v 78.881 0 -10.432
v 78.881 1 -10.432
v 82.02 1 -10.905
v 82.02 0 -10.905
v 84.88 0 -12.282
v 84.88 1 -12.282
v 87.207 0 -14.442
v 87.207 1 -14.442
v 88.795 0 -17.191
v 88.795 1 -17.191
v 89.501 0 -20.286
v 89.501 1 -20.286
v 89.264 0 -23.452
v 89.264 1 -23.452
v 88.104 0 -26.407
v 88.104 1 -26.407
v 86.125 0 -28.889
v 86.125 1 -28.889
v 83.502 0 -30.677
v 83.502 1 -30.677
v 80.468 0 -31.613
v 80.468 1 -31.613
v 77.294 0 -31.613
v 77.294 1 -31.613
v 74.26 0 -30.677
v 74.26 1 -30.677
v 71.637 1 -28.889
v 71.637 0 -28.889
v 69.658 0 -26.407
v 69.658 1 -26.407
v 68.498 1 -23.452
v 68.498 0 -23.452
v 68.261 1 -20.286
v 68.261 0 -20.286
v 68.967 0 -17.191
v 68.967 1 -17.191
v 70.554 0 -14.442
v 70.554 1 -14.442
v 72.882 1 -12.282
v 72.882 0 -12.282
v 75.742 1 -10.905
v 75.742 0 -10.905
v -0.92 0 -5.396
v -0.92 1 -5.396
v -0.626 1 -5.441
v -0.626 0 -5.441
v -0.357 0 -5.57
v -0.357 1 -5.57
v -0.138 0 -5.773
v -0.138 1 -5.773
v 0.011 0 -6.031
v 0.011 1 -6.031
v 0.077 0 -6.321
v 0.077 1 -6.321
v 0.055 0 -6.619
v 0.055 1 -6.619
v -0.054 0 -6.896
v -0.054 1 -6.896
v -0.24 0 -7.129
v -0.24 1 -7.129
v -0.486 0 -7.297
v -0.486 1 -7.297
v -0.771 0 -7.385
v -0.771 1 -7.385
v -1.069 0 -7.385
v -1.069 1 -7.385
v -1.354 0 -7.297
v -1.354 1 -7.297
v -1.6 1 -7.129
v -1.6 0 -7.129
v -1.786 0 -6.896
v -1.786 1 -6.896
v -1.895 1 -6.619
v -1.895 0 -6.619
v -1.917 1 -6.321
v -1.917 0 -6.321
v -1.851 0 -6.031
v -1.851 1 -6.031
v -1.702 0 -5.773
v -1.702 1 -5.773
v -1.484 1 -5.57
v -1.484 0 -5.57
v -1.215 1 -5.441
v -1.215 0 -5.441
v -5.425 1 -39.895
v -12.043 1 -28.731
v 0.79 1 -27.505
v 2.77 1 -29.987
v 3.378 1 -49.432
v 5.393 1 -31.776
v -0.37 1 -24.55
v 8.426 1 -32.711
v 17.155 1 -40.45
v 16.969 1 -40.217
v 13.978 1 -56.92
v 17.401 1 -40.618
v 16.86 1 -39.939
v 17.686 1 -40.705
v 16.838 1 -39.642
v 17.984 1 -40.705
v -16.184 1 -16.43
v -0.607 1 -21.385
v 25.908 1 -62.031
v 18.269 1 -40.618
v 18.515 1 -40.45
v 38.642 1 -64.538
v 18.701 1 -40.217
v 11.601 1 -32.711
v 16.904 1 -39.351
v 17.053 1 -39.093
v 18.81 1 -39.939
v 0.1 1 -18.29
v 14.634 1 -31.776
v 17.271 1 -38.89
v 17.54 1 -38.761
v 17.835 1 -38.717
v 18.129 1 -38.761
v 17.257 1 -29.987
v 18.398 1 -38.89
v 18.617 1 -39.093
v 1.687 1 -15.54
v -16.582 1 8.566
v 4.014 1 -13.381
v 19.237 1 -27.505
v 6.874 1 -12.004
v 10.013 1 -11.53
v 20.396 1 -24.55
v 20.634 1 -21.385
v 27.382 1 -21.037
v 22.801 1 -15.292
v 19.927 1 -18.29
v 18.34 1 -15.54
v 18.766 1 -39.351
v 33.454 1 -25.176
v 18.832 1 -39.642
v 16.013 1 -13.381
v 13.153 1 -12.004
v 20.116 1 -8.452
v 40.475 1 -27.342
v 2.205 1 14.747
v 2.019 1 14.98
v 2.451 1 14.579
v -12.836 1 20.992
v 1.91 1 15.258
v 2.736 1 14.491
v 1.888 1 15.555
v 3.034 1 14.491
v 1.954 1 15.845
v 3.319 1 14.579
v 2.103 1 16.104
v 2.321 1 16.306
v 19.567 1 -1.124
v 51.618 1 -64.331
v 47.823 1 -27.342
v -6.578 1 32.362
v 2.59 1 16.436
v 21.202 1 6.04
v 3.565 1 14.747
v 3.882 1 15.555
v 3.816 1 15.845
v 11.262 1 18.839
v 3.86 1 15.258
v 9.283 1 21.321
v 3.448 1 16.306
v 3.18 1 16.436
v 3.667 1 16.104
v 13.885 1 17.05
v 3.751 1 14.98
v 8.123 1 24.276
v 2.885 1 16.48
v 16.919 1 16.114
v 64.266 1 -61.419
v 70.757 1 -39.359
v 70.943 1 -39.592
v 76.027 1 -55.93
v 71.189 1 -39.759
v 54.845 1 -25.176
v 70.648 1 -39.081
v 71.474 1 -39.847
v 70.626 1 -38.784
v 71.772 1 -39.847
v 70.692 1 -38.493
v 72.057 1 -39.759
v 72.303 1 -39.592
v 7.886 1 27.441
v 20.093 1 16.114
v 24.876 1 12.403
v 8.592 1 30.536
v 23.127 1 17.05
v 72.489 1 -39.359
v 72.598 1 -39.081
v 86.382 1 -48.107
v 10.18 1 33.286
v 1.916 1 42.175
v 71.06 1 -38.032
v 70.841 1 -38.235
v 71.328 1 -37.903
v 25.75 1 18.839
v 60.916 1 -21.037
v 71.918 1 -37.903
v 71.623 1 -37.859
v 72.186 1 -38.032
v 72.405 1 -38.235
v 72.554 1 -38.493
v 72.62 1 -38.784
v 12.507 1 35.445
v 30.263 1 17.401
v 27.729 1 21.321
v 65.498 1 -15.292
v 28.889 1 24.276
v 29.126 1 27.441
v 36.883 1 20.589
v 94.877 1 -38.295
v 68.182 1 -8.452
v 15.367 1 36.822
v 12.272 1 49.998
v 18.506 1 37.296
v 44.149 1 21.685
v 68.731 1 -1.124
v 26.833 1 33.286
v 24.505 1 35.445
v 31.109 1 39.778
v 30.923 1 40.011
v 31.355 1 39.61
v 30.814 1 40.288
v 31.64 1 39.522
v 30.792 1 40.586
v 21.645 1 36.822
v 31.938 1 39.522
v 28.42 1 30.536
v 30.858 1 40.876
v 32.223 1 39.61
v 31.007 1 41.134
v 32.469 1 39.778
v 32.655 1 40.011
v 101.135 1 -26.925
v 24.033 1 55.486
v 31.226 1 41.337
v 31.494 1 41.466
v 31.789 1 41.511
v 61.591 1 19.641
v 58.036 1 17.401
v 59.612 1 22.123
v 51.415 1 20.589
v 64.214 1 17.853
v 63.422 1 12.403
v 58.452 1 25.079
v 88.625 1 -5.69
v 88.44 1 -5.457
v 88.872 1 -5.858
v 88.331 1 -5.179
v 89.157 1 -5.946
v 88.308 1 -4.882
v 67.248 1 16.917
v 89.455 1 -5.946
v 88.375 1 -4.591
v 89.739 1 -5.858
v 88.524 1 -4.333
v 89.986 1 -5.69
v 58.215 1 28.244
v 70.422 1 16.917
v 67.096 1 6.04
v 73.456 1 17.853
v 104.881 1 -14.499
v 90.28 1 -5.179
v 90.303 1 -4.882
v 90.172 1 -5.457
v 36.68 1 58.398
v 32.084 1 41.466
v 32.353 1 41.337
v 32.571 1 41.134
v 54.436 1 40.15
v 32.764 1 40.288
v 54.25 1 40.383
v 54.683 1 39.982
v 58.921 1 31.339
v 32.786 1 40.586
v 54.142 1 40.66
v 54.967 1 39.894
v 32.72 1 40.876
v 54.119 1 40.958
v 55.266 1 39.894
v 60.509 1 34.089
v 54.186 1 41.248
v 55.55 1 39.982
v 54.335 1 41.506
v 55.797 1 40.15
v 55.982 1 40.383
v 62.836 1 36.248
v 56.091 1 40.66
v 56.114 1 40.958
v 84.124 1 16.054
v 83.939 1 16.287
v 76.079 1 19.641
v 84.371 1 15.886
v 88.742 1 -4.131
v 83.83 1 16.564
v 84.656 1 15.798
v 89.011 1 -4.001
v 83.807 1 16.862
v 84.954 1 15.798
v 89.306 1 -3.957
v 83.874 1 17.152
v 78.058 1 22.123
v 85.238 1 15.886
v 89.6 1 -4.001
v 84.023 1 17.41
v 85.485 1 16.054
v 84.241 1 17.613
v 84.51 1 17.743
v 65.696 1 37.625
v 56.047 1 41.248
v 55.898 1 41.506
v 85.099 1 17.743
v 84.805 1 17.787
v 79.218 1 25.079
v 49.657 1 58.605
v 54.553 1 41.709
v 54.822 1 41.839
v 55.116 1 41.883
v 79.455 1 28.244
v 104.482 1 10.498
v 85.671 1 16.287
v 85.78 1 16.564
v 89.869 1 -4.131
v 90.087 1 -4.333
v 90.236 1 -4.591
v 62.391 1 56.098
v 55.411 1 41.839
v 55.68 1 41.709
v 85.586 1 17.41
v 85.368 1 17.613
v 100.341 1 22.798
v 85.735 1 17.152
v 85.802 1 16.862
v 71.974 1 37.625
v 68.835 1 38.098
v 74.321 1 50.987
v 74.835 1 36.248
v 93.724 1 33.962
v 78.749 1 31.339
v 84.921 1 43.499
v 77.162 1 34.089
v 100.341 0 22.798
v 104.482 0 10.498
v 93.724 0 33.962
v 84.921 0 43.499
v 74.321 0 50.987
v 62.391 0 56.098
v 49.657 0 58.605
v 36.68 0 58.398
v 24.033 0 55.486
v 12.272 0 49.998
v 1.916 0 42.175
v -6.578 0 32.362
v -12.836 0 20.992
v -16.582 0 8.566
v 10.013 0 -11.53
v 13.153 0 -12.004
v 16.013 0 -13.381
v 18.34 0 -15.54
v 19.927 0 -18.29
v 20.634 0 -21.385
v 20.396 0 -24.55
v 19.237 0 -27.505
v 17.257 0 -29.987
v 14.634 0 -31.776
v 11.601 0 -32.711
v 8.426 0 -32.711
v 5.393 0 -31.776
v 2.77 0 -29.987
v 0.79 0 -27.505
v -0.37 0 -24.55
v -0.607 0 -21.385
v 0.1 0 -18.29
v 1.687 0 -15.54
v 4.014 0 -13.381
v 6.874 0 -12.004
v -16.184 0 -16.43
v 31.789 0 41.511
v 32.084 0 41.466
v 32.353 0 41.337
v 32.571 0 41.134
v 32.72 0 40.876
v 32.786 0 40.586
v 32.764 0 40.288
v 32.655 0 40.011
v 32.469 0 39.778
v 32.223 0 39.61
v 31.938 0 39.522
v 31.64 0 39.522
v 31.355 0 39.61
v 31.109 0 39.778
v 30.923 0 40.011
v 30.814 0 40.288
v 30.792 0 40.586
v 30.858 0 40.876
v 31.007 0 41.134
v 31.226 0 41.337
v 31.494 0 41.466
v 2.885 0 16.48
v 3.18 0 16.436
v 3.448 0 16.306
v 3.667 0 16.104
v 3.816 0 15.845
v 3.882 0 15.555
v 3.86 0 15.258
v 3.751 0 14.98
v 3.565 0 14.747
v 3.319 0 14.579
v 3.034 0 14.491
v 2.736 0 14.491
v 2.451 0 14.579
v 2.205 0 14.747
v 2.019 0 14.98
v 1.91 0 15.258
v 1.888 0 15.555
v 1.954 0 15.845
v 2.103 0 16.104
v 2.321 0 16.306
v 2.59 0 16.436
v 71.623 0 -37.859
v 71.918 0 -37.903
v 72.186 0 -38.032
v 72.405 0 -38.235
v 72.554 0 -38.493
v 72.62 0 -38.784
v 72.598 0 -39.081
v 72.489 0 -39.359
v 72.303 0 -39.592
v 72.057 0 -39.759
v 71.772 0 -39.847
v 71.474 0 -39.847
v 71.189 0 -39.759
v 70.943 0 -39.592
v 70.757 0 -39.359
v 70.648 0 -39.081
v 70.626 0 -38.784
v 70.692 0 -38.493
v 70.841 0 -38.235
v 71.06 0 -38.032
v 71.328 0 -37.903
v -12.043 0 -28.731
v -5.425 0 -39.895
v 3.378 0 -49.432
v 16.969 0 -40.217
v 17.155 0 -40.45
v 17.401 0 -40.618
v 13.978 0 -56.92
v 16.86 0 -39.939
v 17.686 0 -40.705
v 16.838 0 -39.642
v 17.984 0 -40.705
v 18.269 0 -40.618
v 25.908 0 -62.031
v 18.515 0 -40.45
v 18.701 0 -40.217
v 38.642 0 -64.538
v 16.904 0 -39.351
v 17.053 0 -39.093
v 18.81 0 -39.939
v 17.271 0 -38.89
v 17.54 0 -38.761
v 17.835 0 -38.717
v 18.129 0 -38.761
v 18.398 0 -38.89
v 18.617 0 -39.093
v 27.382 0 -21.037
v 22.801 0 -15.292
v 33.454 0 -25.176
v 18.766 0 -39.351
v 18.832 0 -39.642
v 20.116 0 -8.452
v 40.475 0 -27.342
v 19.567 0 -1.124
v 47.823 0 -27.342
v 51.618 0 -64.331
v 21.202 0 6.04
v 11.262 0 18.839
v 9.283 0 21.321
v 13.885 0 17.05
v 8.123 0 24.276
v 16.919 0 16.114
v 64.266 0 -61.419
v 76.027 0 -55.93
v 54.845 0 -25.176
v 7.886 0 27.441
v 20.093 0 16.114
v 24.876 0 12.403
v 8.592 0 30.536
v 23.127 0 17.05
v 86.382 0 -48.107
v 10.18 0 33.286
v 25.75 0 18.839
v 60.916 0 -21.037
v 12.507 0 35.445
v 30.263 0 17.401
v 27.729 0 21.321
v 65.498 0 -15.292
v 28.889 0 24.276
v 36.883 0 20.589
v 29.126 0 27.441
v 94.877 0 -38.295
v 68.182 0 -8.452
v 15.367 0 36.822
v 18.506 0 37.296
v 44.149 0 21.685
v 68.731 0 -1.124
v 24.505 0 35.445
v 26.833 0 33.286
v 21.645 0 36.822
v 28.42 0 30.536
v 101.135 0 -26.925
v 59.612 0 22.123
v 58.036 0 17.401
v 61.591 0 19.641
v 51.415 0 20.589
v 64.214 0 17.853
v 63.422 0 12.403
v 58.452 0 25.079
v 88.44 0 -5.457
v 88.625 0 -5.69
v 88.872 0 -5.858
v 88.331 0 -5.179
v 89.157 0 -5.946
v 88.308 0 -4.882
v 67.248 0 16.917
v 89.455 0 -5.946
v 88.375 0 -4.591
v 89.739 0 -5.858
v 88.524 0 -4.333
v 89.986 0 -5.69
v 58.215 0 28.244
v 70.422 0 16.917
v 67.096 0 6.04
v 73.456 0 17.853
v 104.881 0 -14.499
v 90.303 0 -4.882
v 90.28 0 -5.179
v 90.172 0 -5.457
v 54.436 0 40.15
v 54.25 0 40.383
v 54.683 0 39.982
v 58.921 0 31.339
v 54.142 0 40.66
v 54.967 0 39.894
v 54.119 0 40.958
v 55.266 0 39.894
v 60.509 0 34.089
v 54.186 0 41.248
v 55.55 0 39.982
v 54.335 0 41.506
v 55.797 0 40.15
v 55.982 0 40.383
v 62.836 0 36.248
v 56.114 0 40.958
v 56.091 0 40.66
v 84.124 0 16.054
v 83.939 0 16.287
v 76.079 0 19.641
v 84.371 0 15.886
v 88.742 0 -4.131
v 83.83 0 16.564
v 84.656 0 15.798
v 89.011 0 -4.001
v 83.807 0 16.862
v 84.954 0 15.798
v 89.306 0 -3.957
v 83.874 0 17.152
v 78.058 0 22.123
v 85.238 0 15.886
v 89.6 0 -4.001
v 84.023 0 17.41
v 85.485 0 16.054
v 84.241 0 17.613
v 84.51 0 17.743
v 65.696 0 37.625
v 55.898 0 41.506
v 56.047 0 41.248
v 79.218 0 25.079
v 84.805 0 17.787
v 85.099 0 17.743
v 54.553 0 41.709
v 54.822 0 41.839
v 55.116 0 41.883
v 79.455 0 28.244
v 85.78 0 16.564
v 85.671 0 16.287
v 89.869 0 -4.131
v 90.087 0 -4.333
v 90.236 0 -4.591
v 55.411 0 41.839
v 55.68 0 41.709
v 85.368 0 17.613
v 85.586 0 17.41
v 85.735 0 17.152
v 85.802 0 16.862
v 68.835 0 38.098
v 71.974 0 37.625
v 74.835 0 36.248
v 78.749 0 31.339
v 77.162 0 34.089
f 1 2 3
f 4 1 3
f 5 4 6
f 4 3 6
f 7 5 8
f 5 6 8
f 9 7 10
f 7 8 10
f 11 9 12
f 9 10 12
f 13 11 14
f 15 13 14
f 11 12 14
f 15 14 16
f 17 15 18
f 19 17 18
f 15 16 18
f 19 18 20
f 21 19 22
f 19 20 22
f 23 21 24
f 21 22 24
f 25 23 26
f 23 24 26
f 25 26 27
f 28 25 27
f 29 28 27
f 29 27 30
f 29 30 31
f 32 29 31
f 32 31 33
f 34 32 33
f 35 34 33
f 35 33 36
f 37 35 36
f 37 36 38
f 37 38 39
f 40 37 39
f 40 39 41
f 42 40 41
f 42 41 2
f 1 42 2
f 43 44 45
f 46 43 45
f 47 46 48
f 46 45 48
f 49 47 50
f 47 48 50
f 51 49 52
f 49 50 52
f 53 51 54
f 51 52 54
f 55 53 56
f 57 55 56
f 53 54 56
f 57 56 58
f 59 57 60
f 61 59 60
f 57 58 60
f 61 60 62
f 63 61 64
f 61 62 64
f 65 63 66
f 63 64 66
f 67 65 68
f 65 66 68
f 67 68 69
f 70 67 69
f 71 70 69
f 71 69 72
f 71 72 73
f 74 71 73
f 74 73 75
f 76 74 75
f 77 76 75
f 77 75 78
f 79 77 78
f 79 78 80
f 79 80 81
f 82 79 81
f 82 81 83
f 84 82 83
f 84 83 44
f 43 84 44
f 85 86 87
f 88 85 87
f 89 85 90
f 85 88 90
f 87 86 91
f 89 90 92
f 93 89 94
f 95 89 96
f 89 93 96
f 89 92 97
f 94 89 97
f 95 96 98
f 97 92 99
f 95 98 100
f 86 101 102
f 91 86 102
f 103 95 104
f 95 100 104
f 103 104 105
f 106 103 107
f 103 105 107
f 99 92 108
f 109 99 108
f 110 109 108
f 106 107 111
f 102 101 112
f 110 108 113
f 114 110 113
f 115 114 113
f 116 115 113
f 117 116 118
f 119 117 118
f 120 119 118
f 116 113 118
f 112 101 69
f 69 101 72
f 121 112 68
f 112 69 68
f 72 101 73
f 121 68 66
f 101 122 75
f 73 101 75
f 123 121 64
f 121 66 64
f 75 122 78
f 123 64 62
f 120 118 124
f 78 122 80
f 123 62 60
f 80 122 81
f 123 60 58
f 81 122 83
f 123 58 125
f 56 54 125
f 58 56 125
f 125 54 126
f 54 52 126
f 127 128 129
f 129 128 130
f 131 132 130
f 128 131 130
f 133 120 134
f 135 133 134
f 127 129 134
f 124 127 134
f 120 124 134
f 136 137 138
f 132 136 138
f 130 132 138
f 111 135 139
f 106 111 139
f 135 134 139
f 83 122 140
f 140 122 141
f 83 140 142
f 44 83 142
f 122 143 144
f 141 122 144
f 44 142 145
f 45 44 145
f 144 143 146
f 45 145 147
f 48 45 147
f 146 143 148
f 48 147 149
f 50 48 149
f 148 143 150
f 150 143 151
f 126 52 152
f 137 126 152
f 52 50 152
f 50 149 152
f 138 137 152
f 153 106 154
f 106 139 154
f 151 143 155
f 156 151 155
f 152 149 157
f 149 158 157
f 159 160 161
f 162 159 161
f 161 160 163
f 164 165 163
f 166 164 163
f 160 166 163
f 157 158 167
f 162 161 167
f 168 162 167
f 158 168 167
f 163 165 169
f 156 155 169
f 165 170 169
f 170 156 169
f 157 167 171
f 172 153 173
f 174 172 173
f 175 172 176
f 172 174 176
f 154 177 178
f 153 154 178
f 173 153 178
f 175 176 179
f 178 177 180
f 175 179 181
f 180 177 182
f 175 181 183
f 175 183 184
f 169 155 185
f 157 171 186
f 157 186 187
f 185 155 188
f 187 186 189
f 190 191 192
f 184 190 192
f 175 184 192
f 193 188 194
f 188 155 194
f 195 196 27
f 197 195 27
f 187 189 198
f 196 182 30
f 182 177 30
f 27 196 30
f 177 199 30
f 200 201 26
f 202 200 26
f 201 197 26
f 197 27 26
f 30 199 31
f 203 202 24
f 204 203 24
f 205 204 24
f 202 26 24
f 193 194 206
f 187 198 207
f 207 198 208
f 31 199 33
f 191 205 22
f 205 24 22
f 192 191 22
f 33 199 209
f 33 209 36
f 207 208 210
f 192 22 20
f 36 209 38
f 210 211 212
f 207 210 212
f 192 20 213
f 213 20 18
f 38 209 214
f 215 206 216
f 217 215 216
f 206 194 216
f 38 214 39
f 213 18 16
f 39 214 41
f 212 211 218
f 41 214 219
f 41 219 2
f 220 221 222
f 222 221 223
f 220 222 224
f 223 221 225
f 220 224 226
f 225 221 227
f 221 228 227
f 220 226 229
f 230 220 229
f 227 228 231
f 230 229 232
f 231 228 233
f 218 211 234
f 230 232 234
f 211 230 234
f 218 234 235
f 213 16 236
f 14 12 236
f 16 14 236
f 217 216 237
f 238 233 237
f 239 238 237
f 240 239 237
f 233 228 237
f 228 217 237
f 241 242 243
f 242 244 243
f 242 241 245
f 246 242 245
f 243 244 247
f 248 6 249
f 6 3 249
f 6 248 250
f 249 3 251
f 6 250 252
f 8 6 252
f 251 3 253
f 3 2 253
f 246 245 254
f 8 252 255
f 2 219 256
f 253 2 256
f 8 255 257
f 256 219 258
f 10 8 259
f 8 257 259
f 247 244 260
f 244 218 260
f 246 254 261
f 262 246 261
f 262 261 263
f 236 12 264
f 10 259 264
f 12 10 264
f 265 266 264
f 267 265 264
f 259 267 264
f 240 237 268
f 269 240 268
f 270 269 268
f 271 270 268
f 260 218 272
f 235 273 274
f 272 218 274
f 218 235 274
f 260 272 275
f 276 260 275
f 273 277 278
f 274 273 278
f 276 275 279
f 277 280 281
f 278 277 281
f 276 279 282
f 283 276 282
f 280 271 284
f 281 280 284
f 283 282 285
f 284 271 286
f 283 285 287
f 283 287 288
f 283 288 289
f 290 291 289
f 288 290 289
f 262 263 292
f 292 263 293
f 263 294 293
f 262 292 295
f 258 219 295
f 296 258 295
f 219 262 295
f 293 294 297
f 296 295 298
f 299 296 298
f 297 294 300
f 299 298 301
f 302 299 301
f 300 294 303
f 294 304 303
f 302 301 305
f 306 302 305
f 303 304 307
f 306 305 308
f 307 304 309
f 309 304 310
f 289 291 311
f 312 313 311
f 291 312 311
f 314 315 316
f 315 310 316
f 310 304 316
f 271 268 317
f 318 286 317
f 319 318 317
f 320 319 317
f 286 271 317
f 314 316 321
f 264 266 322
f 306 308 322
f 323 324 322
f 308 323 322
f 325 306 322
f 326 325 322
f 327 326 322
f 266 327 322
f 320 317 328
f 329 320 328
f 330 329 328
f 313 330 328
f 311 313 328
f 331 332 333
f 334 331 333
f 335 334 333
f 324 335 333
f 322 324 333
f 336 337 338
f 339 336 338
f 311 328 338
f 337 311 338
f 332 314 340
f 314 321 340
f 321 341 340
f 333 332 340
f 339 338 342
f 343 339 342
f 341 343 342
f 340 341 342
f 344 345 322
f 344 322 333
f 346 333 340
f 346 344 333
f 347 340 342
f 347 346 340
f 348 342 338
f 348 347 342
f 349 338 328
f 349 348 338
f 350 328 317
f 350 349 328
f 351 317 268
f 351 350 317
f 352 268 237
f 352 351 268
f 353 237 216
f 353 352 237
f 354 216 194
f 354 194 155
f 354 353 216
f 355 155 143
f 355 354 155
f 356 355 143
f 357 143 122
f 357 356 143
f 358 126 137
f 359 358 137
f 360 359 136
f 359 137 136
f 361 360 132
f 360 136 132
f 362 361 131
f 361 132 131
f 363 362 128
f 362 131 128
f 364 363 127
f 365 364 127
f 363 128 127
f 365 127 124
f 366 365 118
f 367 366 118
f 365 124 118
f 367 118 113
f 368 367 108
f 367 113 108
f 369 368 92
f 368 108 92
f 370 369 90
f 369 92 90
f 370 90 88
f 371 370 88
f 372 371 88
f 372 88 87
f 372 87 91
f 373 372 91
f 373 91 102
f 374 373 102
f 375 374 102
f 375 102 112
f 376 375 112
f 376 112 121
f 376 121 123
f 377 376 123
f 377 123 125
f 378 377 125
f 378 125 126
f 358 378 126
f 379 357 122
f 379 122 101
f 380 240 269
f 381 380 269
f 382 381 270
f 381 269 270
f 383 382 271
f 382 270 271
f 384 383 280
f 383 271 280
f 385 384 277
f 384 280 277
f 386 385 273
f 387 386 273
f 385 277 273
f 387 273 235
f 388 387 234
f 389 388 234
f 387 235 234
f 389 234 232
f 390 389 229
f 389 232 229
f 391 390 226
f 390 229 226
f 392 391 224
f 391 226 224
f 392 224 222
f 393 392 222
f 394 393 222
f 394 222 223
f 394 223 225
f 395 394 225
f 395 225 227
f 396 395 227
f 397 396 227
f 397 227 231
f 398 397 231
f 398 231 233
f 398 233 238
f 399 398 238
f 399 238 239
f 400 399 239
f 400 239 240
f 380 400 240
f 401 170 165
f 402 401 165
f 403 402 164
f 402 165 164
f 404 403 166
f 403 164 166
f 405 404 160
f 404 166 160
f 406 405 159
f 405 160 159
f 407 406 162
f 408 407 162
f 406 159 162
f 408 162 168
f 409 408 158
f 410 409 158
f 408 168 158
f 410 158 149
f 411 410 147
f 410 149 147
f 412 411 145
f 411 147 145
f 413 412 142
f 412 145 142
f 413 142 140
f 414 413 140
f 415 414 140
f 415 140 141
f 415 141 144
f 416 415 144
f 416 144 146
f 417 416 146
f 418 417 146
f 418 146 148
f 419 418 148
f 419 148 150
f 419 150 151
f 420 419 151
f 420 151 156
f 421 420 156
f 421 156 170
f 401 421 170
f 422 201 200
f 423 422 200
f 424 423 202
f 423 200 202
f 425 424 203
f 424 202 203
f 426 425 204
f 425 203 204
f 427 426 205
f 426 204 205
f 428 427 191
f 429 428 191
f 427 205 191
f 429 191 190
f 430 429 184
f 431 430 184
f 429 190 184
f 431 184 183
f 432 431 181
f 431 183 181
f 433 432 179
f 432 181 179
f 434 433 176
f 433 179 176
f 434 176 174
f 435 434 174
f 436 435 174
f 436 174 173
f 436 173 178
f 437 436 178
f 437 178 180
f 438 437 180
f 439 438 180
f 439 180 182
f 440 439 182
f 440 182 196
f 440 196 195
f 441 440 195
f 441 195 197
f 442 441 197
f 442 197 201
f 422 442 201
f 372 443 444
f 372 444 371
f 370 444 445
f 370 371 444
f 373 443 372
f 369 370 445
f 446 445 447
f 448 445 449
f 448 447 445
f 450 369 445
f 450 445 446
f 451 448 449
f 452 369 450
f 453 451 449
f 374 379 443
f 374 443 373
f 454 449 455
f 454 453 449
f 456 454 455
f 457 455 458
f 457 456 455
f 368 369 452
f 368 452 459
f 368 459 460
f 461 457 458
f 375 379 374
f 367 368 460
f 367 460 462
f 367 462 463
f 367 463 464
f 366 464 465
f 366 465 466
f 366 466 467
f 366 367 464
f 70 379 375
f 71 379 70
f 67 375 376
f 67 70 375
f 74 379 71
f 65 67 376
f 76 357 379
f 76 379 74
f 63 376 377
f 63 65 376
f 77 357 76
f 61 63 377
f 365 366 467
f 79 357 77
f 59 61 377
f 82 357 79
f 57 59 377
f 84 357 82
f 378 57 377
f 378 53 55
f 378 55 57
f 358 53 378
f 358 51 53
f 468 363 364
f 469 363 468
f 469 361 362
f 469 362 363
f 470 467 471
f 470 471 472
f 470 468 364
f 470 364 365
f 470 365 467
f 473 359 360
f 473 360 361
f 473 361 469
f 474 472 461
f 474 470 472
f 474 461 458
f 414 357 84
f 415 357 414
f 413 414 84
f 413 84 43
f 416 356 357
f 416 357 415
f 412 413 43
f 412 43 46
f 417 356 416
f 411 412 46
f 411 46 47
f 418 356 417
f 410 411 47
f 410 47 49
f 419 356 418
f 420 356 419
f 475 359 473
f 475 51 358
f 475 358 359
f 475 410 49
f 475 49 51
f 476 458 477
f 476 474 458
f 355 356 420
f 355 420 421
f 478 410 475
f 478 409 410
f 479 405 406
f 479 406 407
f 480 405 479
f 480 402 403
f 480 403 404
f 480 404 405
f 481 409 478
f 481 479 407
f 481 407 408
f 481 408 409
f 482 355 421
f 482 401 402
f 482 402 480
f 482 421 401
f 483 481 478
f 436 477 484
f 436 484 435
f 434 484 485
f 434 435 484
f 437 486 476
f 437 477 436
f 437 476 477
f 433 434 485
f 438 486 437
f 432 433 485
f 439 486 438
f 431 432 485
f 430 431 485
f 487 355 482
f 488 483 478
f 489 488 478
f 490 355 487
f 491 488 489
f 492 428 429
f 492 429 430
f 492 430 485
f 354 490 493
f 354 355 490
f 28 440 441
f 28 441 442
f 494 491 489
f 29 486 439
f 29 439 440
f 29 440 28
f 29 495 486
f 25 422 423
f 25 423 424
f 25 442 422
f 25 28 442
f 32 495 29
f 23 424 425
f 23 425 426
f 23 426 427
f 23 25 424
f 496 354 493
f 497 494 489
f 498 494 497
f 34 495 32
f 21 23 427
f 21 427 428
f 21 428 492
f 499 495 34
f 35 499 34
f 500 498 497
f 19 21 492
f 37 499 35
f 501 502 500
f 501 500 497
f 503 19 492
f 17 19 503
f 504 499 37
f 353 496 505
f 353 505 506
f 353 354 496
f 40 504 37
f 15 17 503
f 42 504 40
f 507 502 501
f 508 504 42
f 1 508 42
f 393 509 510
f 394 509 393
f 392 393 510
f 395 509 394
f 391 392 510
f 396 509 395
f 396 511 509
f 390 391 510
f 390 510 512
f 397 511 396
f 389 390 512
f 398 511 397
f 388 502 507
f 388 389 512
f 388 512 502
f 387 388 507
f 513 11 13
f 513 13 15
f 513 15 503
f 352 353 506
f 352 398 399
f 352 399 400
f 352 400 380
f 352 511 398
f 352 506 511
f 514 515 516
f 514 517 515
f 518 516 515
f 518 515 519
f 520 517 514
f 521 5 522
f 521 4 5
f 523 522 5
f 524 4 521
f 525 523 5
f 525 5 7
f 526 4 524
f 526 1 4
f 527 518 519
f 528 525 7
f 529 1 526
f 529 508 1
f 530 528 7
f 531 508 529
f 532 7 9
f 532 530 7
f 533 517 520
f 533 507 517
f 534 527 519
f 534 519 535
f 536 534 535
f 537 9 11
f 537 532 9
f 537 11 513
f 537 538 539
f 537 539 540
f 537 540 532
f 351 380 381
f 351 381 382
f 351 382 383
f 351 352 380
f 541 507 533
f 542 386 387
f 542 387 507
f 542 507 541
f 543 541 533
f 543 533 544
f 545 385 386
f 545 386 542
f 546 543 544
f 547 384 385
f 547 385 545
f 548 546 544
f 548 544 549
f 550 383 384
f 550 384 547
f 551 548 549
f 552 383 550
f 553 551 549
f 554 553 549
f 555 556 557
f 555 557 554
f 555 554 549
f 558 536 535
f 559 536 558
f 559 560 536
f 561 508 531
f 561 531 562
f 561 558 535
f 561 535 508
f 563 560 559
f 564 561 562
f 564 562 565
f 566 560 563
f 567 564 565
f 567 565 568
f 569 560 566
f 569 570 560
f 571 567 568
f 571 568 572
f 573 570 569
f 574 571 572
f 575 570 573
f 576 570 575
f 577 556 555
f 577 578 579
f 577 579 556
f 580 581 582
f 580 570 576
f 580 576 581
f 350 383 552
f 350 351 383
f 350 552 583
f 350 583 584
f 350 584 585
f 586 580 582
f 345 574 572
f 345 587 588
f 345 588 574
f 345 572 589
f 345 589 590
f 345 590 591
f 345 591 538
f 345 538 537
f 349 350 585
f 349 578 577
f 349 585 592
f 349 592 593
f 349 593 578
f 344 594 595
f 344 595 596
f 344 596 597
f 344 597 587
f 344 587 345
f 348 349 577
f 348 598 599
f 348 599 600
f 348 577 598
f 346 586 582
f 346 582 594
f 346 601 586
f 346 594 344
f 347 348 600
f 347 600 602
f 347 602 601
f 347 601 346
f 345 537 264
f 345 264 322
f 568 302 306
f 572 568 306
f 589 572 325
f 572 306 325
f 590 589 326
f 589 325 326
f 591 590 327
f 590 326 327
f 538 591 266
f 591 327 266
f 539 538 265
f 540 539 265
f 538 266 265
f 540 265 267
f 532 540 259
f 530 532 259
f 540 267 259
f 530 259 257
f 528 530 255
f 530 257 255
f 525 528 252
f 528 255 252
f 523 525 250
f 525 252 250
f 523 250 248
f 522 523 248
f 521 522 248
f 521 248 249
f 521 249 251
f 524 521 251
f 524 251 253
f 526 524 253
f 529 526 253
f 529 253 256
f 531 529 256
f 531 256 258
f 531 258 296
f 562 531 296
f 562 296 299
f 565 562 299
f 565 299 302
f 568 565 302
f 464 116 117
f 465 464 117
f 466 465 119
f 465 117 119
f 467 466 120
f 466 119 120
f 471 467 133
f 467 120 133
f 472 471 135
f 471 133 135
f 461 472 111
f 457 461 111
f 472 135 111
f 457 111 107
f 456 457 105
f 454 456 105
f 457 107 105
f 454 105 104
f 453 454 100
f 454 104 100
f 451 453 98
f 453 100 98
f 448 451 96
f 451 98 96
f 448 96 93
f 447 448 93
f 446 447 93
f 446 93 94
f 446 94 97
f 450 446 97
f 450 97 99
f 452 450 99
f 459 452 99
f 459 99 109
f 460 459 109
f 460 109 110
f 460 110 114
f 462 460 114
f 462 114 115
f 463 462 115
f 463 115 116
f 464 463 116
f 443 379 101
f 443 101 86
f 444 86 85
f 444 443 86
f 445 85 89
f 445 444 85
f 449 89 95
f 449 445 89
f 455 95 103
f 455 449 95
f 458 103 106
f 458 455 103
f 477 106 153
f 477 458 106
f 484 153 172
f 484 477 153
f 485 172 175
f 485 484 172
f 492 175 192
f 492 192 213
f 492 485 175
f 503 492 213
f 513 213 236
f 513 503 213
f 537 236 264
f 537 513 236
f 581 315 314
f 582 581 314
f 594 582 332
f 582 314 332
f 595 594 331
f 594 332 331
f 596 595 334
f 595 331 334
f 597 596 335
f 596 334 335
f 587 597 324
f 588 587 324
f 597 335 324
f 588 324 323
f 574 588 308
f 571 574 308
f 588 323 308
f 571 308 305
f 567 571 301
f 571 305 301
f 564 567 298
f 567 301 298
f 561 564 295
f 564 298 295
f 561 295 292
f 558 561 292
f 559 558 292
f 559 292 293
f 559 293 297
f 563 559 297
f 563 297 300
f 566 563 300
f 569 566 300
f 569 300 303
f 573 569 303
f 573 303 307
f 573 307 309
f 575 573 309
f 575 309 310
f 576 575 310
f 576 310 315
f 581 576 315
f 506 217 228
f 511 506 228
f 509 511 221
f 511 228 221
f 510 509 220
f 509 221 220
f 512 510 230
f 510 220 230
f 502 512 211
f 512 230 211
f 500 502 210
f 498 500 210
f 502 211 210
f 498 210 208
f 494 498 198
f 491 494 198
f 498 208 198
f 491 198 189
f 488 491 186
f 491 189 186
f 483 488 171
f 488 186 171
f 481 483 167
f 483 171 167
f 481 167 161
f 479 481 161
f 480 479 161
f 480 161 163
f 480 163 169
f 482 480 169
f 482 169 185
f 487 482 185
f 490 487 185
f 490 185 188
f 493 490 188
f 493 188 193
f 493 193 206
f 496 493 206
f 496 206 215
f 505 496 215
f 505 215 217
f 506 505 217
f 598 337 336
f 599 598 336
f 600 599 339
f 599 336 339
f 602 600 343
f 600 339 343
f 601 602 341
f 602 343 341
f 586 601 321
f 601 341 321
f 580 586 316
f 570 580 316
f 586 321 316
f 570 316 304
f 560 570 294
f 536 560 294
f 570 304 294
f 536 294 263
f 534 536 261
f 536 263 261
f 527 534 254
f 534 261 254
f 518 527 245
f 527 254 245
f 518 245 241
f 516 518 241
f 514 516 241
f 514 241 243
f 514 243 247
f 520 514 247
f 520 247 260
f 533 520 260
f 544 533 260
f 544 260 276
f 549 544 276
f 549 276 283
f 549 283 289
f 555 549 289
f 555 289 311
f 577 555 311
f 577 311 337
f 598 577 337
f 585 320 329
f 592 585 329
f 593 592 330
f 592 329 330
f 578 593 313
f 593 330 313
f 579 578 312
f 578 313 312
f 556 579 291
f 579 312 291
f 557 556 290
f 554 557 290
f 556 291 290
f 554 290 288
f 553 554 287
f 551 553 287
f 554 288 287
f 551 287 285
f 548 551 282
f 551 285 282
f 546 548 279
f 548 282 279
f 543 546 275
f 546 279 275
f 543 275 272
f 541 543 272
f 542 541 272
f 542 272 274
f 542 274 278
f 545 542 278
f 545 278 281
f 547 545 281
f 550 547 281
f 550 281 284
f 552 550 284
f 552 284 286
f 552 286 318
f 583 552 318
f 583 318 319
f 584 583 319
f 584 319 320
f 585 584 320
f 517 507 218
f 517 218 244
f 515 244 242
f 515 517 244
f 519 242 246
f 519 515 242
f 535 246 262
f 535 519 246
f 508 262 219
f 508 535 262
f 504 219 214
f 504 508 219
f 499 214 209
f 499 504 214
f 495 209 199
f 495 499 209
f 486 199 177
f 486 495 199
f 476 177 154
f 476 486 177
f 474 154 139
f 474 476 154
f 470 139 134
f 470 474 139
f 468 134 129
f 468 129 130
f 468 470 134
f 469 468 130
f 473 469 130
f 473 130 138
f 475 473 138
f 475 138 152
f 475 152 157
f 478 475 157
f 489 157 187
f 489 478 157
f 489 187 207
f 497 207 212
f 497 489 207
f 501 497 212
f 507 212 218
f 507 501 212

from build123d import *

# Parameters (mm, degrees)
SKETCH1_R           = 24.651
BOSS_EXTRUDE1_DEPTH = 1
SKETCH12_R          = 10.65
CUT_EXTRUDE11_DEPTH = 10
SKETCH17_R          = 1
CUT_EXTRUDE16_DEPTH = 12


with BuildPart() as part:
    # Sketch1 → Boss-Extrude1 (new body)
    with BuildSketch(Plane(origin=(0, 0, 0), x_dir=(-0.9998860245595664, 0, 0.015097612078282974), z_dir=(0, 1, 0))):
        with BuildLine():
            Line((16.709723735, 8.315025383), (15.933603805, -16.67292447))
            ThreePointArc((15.933603805, -16.67292447), (-46.108257418, -64.086707389), (-105.088045734, -12.914020093))
            Line((-105.088045734, -12.914020093), (-104.311925805, 12.07392976))
            ThreePointArc((-104.311925805, 12.07392976), (-42.270064581, 59.487712679), (16.709723735, 8.315025383))
        make_face()
        with Locations(Location((-44.189161, -2.299497355, 0), (0, 0, 89.134937682))):
            Circle(SKETCH1_R, mode=Mode.SUBTRACT)
    extrude(amount=BOSS_EXTRUDE1_DEPTH)

    # Sketch12 → Cut-Extrude11 (cut)
    with BuildSketch(Plane(origin=(0, 1, 0), x_dir=(1, 0, 0), z_dir=(0, 1, 0))):
        with Locations(Location((68.835159128, -27.448400712, 0), (0, 0, 270))):
            Circle(SKETCH12_R)
        with Locations(Location((18.50605331, -26.645502828, 0), (0, 0, 270))):
            Circle(SKETCH12_R)
        with Locations(Location((10.013422933, 22.180446939, 0), (0, 0, 270))):
            Circle(SKETCH12_R)
        with Locations(Location((78.880907759, 21.081807158, 0), (0, 0, 270))):
            Circle(SKETCH12_R)
    extrude(amount=-CUT_EXTRUDE11_DEPTH, mode=Mode.SUBTRACT)

    # Sketch17 → Cut-Extrude16 (cut)
    with BuildSketch(Plane(origin=(48.22803339, 1, -7.719999561), x_dir=(-0.9998727759206765, 0, -0.01595092388173346), z_dir=(0, 1, 0))):
        with Locations(Location((-7.662813984, 48.486882974, 0), (0, 0, 90.913959377))):
            Circle(SKETCH17_R)
        with Locations(Location((15.667378709, 48.486882974, 0), (0, 0, 90.913959377))):
            Circle(SKETCH17_R)
        with Locations(Location((44.967394337, 23.920411988, 0), (0, 0, 90.913959377))):
            Circle(SKETCH17_R)
        with Locations(Location((49.120943166, 2.107633512, 0), (0, 0, 90.913959377))):
            Circle(SKETCH17_R)
        with Locations(Location((30.899804125, -31.507727626, 0), (0, 0, 90.913959377))):
            Circle(SKETCH17_R)
        with Locations(Location((-22.895239399, -31.507727626, 0), (0, 0, 90.913959377))):
            Circle(SKETCH17_R)
        with Locations(Location((-41.116378441, 2.107633512, 0), (0, 0, 90.913959377))):
            Circle(SKETCH17_R)
        with Locations(Location((-36.962829611, 23.920411988, 0), (0, 0, 90.913959377))):
            Circle(SKETCH17_R)
    extrude(amount=-CUT_EXTRUDE16_DEPTH, mode=Mode.SUBTRACT)


solid = part.part
